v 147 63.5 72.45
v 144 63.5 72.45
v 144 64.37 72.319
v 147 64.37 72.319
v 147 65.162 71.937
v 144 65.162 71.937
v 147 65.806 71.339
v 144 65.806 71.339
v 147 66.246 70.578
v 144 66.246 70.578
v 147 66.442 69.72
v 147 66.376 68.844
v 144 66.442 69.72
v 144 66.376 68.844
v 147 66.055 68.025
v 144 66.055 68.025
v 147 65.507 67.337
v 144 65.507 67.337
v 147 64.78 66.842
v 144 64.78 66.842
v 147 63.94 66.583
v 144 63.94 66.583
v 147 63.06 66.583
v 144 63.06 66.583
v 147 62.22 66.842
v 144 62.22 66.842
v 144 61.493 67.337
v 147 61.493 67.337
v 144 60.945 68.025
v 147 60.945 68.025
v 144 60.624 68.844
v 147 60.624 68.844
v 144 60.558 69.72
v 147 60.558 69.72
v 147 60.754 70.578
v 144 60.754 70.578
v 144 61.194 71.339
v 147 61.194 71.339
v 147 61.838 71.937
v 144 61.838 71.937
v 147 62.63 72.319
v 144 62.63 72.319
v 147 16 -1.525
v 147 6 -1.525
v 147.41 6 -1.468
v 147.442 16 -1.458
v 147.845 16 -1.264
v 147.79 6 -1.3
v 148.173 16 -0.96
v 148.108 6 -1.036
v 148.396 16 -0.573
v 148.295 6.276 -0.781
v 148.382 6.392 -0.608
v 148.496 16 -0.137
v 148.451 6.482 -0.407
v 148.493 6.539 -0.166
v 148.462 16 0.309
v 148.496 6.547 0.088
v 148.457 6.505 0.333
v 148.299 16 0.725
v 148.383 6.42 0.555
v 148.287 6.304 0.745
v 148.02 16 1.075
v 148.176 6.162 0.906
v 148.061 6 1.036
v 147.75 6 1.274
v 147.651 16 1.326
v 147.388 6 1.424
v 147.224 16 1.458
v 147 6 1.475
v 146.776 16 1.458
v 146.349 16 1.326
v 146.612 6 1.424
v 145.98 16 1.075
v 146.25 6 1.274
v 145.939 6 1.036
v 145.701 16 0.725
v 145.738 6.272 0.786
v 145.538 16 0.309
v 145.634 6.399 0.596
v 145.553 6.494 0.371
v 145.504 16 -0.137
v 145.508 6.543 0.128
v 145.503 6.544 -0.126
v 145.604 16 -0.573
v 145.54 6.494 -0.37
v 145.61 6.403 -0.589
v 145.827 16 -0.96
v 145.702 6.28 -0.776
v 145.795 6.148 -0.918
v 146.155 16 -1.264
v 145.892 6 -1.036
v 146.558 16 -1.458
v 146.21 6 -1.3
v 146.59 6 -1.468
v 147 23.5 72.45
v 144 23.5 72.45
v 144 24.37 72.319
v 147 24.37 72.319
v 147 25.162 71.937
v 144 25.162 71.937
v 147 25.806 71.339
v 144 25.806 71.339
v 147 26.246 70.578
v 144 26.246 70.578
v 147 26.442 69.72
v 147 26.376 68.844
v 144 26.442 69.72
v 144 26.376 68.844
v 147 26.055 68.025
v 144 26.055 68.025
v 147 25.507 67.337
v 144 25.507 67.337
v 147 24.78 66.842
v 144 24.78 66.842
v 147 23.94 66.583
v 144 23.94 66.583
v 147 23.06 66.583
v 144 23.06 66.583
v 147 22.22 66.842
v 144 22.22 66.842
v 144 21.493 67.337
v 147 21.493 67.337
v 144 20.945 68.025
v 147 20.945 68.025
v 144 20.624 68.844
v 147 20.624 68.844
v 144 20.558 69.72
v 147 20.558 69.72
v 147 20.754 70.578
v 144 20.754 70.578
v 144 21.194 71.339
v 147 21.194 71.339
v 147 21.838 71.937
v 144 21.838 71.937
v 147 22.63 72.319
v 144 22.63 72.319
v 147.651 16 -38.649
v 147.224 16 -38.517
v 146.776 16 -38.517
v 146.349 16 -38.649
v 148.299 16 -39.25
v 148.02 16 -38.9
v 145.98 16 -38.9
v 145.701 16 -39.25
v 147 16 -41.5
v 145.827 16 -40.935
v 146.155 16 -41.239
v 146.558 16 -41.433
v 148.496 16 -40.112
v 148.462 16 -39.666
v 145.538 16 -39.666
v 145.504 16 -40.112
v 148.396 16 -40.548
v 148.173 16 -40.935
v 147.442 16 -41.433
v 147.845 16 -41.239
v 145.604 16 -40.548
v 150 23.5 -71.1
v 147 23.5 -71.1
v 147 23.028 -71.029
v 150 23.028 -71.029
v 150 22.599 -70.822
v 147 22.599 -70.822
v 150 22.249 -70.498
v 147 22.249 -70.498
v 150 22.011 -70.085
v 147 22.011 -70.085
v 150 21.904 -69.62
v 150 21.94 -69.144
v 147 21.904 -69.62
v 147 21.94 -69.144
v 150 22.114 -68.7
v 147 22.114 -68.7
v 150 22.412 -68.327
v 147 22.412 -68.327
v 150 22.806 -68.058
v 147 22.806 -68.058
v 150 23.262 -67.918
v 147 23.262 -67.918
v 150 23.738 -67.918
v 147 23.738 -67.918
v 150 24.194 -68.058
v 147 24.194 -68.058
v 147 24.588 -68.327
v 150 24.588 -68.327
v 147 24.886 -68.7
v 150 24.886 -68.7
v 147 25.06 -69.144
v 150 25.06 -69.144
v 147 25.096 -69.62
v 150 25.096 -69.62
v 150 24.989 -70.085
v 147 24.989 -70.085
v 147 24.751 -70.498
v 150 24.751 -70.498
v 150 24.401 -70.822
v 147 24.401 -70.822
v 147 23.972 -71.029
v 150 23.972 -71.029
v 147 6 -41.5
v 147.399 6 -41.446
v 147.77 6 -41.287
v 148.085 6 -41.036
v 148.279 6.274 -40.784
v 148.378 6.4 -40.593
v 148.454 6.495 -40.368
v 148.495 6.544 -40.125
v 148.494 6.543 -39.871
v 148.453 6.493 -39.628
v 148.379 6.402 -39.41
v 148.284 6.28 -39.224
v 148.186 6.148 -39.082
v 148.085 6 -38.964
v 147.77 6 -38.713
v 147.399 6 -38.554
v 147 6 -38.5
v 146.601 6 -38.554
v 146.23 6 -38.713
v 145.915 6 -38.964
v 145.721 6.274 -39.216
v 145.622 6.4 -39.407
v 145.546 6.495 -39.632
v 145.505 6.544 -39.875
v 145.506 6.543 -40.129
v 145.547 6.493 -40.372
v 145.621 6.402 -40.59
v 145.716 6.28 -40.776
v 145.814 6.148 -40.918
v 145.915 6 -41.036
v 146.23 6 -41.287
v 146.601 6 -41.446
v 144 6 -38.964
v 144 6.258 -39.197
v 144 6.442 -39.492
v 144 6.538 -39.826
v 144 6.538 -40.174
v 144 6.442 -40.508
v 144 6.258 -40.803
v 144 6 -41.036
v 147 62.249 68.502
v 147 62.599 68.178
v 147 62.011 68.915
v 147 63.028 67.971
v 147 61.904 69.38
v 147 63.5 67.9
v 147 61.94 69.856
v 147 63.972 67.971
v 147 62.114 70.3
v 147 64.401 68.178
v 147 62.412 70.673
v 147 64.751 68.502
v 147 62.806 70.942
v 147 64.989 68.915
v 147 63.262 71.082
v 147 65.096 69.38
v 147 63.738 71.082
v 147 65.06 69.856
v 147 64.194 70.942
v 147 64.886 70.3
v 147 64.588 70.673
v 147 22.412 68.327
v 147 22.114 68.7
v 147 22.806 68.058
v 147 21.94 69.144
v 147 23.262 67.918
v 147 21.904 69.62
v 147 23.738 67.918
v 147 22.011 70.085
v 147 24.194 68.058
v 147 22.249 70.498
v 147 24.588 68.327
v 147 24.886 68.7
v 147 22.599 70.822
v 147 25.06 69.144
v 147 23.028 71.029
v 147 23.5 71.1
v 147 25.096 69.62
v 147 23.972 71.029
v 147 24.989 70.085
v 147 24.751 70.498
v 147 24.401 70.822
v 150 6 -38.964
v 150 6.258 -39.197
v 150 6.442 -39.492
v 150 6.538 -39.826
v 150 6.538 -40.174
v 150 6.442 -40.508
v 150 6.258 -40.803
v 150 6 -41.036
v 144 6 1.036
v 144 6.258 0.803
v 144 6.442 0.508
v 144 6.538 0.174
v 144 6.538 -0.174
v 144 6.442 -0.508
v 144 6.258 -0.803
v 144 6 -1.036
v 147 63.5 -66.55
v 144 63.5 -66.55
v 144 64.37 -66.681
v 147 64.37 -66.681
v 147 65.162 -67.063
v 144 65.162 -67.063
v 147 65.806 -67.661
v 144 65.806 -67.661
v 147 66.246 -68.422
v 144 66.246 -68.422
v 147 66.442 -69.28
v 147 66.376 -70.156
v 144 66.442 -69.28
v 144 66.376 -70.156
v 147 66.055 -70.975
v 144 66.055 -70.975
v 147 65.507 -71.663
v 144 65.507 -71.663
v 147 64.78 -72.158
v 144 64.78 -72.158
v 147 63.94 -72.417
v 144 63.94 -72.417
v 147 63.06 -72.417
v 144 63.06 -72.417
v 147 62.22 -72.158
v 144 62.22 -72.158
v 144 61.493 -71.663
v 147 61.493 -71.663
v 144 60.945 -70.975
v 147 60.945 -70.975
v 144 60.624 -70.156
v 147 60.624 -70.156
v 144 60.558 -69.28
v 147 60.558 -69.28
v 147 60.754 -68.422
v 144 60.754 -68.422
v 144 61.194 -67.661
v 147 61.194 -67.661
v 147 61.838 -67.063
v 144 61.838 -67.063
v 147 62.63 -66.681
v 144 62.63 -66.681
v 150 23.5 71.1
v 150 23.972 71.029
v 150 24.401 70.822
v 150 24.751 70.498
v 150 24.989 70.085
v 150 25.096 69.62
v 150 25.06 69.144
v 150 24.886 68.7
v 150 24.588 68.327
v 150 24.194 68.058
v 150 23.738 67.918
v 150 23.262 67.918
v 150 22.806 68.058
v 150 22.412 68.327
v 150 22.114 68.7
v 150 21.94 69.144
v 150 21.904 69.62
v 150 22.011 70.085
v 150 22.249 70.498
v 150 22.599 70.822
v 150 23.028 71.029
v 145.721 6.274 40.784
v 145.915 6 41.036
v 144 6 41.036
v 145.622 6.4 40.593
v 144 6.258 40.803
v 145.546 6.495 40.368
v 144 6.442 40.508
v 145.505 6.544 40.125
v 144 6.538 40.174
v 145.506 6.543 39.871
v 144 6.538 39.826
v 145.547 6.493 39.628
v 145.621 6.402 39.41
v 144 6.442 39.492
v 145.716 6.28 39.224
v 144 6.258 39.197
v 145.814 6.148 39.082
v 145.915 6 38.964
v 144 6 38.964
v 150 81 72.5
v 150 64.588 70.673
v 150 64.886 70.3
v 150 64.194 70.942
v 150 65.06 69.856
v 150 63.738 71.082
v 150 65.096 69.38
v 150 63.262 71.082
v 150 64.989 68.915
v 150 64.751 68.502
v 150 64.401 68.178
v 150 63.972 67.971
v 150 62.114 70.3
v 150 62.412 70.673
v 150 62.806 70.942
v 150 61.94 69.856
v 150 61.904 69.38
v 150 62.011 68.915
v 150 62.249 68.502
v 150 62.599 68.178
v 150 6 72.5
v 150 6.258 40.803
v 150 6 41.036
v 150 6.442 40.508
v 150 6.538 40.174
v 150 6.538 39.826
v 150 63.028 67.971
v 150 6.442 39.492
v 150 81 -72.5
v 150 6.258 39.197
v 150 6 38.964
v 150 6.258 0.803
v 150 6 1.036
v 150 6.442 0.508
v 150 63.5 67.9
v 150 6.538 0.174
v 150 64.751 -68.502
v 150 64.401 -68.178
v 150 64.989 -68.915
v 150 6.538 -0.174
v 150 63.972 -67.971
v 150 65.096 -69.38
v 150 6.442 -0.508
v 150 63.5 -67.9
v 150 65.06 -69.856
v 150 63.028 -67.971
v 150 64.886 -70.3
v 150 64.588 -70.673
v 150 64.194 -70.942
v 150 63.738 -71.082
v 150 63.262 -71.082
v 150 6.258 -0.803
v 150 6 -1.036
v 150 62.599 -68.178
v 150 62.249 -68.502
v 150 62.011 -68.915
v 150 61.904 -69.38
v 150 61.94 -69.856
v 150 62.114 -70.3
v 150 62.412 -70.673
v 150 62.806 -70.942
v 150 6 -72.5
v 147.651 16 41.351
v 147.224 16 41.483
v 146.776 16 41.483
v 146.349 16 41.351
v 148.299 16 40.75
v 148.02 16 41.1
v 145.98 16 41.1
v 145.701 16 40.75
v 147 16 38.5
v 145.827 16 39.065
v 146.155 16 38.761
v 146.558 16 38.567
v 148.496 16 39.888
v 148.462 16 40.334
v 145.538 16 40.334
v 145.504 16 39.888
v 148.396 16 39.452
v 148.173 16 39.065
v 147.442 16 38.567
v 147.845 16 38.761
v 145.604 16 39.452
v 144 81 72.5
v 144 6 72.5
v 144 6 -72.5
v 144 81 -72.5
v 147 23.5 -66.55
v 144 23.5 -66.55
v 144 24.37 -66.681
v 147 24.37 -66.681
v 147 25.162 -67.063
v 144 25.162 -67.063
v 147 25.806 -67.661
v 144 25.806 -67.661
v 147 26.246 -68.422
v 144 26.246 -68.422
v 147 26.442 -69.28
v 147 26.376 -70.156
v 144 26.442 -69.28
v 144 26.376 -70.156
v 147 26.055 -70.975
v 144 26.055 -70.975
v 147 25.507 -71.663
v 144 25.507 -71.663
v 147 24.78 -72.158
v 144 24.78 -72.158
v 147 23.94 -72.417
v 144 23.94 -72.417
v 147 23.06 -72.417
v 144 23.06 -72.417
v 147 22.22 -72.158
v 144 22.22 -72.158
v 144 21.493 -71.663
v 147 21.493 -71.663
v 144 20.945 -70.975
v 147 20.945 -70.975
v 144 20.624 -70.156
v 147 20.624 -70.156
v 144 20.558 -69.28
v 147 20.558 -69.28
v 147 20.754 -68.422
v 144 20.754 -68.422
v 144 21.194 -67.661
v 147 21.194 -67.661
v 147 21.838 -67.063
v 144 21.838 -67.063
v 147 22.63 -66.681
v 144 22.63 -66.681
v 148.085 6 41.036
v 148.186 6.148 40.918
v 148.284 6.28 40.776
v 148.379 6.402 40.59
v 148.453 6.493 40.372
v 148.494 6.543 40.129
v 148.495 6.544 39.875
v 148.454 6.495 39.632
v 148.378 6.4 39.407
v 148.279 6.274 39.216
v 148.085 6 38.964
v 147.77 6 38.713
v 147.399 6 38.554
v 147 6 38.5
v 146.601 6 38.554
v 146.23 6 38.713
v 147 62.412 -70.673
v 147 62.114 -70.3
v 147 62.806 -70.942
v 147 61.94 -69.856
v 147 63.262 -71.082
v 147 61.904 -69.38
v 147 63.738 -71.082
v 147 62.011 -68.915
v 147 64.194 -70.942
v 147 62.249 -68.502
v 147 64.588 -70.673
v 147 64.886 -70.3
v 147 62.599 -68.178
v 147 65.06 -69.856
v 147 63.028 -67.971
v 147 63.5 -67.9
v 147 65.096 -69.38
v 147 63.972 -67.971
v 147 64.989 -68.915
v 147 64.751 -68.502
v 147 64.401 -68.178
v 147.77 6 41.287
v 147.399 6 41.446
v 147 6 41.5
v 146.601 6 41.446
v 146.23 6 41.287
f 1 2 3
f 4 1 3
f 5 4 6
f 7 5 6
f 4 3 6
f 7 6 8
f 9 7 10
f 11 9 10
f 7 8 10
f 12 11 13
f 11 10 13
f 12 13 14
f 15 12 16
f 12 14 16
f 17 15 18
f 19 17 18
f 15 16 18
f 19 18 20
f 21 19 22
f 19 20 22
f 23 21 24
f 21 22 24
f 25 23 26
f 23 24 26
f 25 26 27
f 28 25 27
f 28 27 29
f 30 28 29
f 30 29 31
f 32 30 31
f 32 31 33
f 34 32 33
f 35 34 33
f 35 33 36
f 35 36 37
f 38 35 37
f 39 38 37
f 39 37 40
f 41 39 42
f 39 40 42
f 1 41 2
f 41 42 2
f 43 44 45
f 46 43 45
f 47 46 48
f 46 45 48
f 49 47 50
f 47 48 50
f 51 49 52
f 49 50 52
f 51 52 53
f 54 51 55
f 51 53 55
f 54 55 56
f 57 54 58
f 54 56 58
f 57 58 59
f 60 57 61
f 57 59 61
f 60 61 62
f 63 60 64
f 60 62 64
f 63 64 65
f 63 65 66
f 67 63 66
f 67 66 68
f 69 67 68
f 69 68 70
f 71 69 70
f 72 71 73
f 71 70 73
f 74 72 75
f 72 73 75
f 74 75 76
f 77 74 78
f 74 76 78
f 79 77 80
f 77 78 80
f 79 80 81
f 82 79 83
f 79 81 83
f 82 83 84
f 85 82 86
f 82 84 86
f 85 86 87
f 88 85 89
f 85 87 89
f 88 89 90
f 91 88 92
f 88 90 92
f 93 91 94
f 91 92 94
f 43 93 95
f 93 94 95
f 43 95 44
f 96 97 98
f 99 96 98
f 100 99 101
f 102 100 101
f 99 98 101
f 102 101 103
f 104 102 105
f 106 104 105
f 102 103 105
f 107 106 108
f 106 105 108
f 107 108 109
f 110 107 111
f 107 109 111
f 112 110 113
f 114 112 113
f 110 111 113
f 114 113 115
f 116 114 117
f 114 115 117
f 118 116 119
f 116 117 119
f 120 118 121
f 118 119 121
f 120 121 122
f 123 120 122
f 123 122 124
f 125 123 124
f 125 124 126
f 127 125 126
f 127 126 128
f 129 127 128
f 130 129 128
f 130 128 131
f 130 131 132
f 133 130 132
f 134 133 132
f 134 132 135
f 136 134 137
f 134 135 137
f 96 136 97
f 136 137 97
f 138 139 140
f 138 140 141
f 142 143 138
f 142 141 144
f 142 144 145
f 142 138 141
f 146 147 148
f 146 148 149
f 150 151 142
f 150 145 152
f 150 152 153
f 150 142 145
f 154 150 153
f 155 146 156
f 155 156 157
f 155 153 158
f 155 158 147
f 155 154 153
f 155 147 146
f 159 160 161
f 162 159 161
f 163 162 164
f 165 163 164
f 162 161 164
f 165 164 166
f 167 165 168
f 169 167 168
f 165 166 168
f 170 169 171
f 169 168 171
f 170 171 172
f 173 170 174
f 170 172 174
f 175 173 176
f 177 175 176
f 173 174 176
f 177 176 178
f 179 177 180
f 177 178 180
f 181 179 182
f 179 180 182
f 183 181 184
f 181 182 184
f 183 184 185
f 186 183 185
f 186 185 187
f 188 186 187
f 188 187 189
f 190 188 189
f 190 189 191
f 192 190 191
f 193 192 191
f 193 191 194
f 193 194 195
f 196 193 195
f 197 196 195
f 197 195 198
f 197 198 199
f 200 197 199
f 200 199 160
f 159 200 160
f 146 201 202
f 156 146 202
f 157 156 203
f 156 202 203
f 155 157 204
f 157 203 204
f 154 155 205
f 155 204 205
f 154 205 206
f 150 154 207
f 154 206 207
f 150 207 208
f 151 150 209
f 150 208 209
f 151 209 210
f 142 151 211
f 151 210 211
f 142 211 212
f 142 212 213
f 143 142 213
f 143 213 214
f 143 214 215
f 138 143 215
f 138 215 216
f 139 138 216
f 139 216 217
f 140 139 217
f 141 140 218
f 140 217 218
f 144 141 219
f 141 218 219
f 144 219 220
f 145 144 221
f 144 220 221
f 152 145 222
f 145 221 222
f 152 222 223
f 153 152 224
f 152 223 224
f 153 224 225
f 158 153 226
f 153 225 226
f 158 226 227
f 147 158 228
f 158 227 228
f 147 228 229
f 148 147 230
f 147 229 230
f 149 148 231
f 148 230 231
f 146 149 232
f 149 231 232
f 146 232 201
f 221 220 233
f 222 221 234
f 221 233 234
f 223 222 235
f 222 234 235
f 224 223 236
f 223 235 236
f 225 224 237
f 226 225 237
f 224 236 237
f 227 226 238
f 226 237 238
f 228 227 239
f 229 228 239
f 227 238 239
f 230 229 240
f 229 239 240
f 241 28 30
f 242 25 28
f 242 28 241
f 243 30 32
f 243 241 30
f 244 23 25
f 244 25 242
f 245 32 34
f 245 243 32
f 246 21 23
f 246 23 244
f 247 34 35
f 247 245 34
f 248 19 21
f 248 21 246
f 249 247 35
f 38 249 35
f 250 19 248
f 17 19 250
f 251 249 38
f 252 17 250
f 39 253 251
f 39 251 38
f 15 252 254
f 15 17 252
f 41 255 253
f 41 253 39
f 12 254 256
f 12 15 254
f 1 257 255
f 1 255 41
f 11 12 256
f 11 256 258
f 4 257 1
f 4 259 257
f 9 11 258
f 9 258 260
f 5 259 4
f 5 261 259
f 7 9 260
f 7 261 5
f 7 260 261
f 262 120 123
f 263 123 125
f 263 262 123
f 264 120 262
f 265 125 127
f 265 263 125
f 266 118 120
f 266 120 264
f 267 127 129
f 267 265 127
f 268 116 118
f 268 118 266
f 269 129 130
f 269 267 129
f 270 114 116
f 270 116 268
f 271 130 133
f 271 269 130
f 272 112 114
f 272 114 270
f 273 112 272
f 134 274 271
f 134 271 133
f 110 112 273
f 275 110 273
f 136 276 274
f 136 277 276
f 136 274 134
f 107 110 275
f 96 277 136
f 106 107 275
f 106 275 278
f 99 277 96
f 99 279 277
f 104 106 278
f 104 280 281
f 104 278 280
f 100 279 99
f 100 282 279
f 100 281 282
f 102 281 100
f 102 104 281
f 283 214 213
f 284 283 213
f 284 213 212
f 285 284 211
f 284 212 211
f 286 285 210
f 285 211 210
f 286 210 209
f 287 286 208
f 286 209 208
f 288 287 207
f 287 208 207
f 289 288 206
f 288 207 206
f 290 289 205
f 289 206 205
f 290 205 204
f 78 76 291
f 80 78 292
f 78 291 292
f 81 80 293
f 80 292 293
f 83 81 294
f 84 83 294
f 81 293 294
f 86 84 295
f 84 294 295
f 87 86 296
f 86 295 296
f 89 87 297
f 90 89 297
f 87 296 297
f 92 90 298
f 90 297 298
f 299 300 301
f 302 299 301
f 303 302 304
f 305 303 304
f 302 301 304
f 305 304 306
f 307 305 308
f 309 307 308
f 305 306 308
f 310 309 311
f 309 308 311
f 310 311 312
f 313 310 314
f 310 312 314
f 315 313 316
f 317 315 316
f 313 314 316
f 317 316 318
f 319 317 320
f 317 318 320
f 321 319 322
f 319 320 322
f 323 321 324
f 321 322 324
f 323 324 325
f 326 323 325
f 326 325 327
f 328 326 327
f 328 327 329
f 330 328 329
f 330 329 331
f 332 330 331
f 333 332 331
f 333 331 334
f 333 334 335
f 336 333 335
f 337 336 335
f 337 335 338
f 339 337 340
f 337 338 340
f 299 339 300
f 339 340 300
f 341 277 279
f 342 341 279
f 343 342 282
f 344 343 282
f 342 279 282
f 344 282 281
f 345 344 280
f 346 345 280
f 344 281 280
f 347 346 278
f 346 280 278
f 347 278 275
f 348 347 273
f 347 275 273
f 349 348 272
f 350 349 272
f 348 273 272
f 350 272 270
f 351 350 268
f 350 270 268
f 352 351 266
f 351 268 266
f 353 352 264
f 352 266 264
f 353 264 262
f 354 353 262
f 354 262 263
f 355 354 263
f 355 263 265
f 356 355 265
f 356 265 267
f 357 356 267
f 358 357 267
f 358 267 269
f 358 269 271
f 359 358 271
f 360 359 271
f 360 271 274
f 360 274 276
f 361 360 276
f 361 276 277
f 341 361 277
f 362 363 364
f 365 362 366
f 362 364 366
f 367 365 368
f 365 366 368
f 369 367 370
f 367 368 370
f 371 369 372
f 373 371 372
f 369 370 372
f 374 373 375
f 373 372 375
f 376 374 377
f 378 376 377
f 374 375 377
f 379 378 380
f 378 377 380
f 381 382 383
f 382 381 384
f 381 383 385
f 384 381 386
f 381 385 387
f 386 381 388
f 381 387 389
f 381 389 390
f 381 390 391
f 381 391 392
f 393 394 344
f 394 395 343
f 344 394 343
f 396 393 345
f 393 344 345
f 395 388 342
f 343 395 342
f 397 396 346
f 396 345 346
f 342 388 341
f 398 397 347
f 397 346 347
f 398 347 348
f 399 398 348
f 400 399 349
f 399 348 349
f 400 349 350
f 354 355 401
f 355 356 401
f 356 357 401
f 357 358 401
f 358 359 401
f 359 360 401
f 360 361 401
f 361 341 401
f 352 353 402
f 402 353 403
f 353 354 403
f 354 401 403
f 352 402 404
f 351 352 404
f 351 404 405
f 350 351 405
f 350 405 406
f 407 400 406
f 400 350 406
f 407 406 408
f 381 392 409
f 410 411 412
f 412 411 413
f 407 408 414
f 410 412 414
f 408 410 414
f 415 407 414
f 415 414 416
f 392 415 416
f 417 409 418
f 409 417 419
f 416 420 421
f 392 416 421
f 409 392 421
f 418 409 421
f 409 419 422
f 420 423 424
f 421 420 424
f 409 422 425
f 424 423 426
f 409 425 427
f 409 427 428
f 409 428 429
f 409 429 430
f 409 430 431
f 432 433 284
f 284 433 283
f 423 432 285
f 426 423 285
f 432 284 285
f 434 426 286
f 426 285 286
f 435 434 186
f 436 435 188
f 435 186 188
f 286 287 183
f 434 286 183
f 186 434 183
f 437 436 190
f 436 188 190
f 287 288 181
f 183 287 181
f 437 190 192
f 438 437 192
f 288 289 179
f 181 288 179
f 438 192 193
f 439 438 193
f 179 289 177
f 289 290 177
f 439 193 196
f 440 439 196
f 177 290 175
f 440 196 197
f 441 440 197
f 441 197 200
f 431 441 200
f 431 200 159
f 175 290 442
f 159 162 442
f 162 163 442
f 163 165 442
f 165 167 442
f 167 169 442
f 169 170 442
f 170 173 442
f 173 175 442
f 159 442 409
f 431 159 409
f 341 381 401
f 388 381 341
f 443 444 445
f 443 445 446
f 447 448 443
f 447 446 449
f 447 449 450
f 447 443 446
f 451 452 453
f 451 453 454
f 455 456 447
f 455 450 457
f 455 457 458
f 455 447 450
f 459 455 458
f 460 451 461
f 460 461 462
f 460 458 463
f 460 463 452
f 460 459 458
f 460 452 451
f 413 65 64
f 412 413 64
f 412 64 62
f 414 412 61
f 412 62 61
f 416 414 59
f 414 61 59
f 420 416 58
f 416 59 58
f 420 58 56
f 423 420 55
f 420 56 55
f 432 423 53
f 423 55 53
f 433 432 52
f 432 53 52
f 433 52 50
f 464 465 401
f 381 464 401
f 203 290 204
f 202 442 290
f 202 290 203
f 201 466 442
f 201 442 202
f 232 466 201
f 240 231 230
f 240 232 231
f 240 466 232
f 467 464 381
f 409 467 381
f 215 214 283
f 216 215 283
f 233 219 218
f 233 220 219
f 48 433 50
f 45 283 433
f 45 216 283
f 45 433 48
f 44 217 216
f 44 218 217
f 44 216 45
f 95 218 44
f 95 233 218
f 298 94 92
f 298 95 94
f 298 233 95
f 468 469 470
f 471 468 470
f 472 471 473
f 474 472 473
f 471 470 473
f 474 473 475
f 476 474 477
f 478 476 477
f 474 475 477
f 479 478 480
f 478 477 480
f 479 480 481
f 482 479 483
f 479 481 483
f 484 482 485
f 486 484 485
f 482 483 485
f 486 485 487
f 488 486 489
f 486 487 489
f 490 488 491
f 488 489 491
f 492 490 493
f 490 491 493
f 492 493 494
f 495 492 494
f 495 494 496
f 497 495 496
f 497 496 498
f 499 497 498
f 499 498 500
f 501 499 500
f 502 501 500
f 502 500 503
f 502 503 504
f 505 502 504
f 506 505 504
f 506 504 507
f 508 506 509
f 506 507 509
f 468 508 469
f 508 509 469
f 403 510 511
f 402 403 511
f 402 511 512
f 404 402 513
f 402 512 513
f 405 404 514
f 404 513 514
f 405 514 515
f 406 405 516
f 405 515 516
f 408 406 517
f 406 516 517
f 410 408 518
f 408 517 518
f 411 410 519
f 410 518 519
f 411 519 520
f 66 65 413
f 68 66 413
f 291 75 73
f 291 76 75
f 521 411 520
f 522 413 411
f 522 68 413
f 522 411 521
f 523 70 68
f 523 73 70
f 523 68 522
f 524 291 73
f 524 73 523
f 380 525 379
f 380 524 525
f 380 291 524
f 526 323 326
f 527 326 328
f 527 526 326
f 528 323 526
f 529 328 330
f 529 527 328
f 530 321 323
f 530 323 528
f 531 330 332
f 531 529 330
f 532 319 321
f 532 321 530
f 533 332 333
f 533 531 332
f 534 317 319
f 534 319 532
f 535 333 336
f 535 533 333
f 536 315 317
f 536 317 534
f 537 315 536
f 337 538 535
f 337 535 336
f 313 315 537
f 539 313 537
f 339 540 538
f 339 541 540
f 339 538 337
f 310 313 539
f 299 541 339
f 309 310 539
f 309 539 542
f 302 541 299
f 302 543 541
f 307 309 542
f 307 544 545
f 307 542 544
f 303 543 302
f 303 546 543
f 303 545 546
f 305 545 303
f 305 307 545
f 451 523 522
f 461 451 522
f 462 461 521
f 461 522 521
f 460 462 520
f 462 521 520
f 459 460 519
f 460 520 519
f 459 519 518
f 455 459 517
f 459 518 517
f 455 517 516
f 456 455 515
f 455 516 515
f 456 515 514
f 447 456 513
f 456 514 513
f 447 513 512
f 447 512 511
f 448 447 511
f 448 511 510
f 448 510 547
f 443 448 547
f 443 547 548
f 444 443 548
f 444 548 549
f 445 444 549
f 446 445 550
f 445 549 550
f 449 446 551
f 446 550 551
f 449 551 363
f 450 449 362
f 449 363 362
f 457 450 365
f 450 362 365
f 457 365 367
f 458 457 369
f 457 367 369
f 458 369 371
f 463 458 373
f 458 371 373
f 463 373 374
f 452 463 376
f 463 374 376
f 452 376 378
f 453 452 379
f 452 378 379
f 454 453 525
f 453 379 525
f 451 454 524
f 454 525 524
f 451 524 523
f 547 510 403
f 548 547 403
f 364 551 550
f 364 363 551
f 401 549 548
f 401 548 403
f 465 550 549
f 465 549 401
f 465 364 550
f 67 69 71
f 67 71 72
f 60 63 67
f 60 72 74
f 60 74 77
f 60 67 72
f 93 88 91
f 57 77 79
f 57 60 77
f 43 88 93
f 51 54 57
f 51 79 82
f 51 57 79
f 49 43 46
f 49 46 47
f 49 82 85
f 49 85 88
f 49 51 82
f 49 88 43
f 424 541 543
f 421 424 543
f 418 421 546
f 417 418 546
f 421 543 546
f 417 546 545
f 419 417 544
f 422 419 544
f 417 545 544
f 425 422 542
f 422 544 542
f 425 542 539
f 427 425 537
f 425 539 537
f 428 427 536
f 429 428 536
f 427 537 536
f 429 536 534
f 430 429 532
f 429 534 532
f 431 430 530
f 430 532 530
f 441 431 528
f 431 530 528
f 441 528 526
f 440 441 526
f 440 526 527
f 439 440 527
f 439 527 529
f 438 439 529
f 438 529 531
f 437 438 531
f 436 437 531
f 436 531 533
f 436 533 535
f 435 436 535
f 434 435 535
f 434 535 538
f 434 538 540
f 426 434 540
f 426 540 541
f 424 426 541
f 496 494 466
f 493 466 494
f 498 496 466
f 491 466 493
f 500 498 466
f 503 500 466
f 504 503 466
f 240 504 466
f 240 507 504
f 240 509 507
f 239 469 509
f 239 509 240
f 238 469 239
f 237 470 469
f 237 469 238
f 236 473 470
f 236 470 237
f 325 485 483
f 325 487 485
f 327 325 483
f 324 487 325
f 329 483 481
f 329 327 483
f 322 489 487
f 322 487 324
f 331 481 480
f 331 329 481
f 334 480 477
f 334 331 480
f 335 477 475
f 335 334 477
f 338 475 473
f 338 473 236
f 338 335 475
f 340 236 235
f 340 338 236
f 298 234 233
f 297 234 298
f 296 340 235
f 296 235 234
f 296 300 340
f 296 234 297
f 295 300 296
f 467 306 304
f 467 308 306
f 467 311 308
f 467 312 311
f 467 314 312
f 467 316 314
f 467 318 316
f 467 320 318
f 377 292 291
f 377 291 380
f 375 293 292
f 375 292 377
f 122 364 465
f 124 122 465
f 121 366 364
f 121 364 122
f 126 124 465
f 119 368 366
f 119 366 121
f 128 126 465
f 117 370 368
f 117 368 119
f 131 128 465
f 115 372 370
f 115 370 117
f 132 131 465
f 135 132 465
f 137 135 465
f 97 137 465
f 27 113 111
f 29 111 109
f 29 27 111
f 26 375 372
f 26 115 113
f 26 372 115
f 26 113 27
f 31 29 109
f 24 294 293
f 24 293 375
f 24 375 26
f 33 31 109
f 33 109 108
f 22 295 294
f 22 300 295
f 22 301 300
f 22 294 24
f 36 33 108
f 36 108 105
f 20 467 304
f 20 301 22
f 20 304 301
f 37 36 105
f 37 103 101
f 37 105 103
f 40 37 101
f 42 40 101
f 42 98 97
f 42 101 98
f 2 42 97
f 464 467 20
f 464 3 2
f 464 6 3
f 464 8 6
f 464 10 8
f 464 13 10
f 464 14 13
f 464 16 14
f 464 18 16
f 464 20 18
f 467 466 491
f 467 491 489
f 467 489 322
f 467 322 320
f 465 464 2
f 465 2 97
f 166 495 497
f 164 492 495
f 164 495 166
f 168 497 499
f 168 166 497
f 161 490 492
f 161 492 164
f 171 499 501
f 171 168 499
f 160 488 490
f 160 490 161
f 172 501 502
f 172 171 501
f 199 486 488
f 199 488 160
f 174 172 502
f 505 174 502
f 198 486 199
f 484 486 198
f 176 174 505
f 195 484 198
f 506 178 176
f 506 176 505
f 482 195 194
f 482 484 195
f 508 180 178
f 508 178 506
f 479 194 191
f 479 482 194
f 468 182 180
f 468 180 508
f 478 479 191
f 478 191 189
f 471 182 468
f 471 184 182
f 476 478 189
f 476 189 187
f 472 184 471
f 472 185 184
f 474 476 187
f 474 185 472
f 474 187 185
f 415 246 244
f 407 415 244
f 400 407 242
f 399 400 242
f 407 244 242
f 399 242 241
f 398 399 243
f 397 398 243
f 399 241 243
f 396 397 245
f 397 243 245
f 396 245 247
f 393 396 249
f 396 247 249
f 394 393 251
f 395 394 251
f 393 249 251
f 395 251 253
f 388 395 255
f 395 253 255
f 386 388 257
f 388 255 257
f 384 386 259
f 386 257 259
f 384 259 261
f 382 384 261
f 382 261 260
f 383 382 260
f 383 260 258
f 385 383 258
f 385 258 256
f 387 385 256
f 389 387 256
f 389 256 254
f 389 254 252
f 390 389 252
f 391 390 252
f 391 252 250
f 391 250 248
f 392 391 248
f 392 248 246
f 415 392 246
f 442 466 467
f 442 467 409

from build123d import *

# Parameters (mm, degrees)
SKETCH_1_W          = 300
SKETCH_1_H          = 145
EXTRUDE_1_DEPTH     = 81
SHELL_1_T           = -6
SKETCH_2_R          = 2.55
CUT_EXTRUDE_1_DEPTH = 183.705363906
SKETCH_3_R          = 4.25
CUT_EXTRUDE_2_DEPTH = 3
SKETCH_4_W          = 145
SKETCH_4_H          = 81
CUT_EXTRUDE_3_DEPTH = 314.453744594
SKETCH_5_W          = 145
SKETCH_5_H          = 6
CUT_EXTRUDE_4_DEPTH = 109.872632006
SKETCH_6_R          = 1.6
SKETCH_6_R_2        = 1.25
CUT_EXTRUDE_5_DEPTH = 109.872632006
SKETCH_7_R          = 2.95
CUT_EXTRUDE_6_DEPTH = 3
SKETCH_8_R          = 1.5
CUT_EXTRUDE_7_DEPTH = 10


with BuildPart() as part:
    # ｽｹｯﾁ1 → ﾎﾞｽ - 押し出し1 (new body)
    with BuildSketch(Plane(origin=(0, 0, 0), x_dir=(1, 0, 0), z_dir=(0, 1, 0))):
        Rectangle(SKETCH_1_W, SKETCH_1_H)
    extrude(amount=EXTRUDE_1_DEPTH)

    # ｼｪﾙ1
    shell_1_openings = [part.faces().sort_by_distance(p)[0] for p in [
        (0, 81, 0),
    ]]
    offset(amount=SHELL_1_T, openings=shell_1_openings, kind=Kind.INTERSECTION)

    # ｽｹｯﾁ2 → ｶｯﾄ - 押し出し1 (cut, through all)
    with BuildSketch(Plane(origin=(0, 6, 0), x_dir=(1, 0, 0), z_dir=(0, 1, 0))):
        with Locations(Location((140, 60, 0), (0, 0, 270))):
            Circle(SKETCH_2_R)
        with Locations(Location((140, -60, 0), (0, 0, 90))):
            Circle(SKETCH_2_R)
        with Locations(Location((-22.5, -60, 0), (0, 0, 270))):
            Circle(SKETCH_2_R)
        with Locations(Location((-22.5, 60, 0), (0, 0, 90))):
            Circle(SKETCH_2_R)
    extrude(amount=-CUT_EXTRUDE_1_DEPTH, mode=Mode.SUBTRACT)

    # ｽｹｯﾁ3 → ｶｯﾄ - 押し出し2 (cut)
    with BuildSketch(Plane(origin=(0, 6, 0), x_dir=(1, 0, 0), z_dir=(0, 1, 0))):
        with Locations(Location((140, 60, 0), (0, 0, 270))):
            Circle(SKETCH_3_R)
        with Locations(Location((-22.5, 60, 0), (0, 0, 270))):
            Circle(SKETCH_3_R)
        with Locations(Location((-22.5, -60, 0), (0, 0, 270))):
            Circle(SKETCH_3_R)
        with Locations(Location((140, -60, 0), (0, 0, 270))):
            Circle(SKETCH_3_R)
    extrude(amount=-CUT_EXTRUDE_2_DEPTH, mode=Mode.SUBTRACT)

    # ｽｹｯﾁ4 → ｶｯﾄ - 押し出し3 (cut, through all)
    with BuildSketch(Plane.ZY.offset(-144)):
        with Locations((0, 40.5)):
            Rectangle(SKETCH_4_W, SKETCH_4_H)
    extrude(amount=CUT_EXTRUDE_3_DEPTH, mode=Mode.SUBTRACT)

    # ｽｹｯﾁ5 → ｶｯﾄ - 押し出し4 (cut, through all)
    with BuildSketch(Plane.ZY.offset(-144)):
        with Locations((0, 3)):
            Rectangle(SKETCH_5_W, SKETCH_5_H)
    extrude(amount=-CUT_EXTRUDE_4_DEPTH, mode=Mode.SUBTRACT)

    # ｽｹｯﾁ6 → ｶｯﾄ - 押し出し5 (cut, through all)
    with BuildSketch(Plane.ZY.offset(-144)):
        with Locations((-69.5, 63.5)):
            Circle(SKETCH_6_R)
        with Locations(Location((-69.5, 23.5, 0), (0, 0, 180))):
            Circle(SKETCH_6_R)
        with Locations((69.5, 23.5)):
            Circle(SKETCH_6_R)
        with Locations(Location((69.5, 63.5, 0), (0, 0, 180))):
            Circle(SKETCH_6_R)
        with Locations((-40, 5.3)):
            Circle(SKETCH_6_R_2)
        with Locations((0, 5.3)):
            Circle(SKETCH_6_R_2)
        with Locations((40, 5.3)):
            Circle(SKETCH_6_R_2)
    extrude(amount=-CUT_EXTRUDE_5_DEPTH, mode=Mode.SUBTRACT)

    # ｽｹｯﾁ7 → ｶｯﾄ - 押し出し6 (cut)
    with BuildSketch(Plane.ZY.offset(-144)):
        with Locations((-69.5, 63.5)):
            Circle(SKETCH_7_R)
        with Locations((-69.5, 23.5)):
            Circle(SKETCH_7_R)
        with Locations((69.5, 63.5)):
            Circle(SKETCH_7_R)
        with Locations((69.5, 23.5)):
            Circle(SKETCH_7_R)
    extrude(amount=-CUT_EXTRUDE_6_DEPTH, mode=Mode.SUBTRACT)

    # ｽｹｯﾁ8 → ｶｯﾄ - 押し出し7 (cut)
    with BuildSketch(Plane.XZ.offset(-6)):
        with Locations(Location((147, 40, 0), (0, 0, 270))):
            Circle(SKETCH_8_R)
        with Locations(Location((147, -0.025, 0), (0, 0, 270))):
            Circle(SKETCH_8_R)
        with Locations(Location((147, -40, 0), (0, 0, 270))):
            Circle(SKETCH_8_R)
    extrude(amount=-CUT_EXTRUDE_7_DEPTH, mode=Mode.SUBTRACT)


solid = part.part
